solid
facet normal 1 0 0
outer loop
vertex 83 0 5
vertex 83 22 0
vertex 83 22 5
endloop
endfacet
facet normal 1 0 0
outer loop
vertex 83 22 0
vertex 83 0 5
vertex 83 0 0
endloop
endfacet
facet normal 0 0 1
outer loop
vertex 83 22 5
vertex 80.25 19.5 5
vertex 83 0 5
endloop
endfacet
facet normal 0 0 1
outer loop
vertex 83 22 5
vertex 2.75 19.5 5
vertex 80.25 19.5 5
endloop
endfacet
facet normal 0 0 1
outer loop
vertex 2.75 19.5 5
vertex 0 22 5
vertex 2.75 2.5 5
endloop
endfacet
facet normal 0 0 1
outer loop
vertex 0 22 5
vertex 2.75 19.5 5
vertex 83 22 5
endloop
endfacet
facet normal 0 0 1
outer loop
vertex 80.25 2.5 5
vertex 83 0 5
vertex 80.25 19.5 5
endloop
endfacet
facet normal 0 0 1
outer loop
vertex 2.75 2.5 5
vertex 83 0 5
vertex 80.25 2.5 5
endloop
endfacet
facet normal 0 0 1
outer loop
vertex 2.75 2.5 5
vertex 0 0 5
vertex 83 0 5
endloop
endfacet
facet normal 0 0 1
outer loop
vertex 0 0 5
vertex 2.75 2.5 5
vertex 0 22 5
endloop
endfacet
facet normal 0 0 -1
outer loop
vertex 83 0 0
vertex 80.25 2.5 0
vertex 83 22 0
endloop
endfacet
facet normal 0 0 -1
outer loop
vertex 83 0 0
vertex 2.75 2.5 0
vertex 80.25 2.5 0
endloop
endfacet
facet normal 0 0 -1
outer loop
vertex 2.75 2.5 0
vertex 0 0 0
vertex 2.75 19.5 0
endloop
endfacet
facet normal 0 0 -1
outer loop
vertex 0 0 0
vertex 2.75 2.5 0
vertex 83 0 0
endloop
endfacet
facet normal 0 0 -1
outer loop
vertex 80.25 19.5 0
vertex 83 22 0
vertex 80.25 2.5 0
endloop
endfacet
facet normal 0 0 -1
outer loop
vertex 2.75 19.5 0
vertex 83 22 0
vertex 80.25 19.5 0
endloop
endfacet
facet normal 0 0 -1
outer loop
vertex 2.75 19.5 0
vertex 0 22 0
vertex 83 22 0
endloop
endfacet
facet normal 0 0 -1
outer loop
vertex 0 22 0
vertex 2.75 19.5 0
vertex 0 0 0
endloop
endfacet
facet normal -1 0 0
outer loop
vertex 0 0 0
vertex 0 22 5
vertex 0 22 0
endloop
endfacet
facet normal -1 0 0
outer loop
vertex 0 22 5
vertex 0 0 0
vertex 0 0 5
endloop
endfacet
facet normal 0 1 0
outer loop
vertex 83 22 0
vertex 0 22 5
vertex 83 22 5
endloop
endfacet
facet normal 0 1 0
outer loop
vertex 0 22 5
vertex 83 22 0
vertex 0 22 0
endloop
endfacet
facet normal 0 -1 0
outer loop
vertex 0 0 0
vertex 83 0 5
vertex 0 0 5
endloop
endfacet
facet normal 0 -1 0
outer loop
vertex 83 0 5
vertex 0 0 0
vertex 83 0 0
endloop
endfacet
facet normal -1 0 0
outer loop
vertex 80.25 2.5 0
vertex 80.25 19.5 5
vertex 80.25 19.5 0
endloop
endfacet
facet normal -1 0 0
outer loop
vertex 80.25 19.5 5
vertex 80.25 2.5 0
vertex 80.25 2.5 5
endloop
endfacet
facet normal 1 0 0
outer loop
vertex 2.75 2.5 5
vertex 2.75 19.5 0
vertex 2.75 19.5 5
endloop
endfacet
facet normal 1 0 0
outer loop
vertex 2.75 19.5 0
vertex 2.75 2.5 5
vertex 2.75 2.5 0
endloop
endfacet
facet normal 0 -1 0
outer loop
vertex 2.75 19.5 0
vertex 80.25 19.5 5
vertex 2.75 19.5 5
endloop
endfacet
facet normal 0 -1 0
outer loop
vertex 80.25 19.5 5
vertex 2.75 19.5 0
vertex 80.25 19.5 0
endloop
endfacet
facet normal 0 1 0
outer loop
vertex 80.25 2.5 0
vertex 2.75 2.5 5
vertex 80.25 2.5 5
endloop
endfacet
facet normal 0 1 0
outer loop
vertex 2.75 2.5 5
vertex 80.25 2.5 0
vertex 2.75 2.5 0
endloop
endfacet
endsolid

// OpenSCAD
/*
    created 1 Feb 2021
    modified 7th feb, updated sizes. 
    modified 7th feb, updated sizes. 
    
    by Matt Jones (Crazy-Logic)  
    This example code is in the public domain.
    
    a test peice for dell caddy as a holder. 
    
    print upside down to save on material being wasted. 
*/

//sizes 
cwidth = 75+1.5+1; //think need to be 77.5
cheight= 15+1+1; //

width = 83;
depth = 22; 
height = 5;

woff = (width-cwidth)/2;
hoff = (depth-cheight)/2;





difference(){
    cube([width,depth,height]);
    //cutout for drive
    translate([woff,hoff,-1])
    cube([cwidth,cheight,height+2]);
    
    
}
